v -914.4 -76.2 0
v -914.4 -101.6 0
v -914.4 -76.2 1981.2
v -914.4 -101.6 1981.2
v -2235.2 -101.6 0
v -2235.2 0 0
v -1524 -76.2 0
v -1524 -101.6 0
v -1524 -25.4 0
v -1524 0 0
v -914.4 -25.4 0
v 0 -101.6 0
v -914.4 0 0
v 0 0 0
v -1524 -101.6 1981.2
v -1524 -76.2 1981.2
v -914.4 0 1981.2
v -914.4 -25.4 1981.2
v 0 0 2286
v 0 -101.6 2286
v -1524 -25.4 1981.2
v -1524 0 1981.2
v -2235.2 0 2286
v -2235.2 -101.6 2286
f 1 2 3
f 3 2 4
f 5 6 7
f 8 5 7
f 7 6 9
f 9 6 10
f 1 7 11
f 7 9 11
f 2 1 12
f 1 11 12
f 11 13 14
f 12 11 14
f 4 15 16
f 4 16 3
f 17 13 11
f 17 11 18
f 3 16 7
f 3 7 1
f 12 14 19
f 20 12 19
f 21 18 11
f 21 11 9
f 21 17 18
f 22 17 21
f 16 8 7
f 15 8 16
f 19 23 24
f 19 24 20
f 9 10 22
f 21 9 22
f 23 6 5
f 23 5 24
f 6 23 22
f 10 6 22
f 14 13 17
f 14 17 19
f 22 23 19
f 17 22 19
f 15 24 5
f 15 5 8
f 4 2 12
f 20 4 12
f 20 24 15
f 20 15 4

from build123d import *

# Parameters (mm, degrees)
F0_W     = 2235.2
F0_H     = 2286
F1_DEPTH = 101.6
F2_W     = 609.6
F2_H     = 1981.2
F3_DEPTH = 25.4
F4_W     = 609.6
F4_H     = 1981.2
F5_DEPTH = 25.4


with BuildPart() as f1:
    # F0 (on Front) → F1 (new body)
    with BuildSketch(Plane.XZ):
        with Locations((-1117.6, 1143)):
            Rectangle(F0_W, F0_H)
    extrude(amount=F1_DEPTH)

    # F2 (on face) → F3 (cut)
    with BuildSketch(Plane.XZ.offset(101.6)):
        with Locations((-1219.2, 990.6)):
            Rectangle(F2_W, F2_H)
    extrude(amount=-F3_DEPTH, mode=Mode.SUBTRACT)

    # F4 (on face) → F5 (cut)
    with BuildSketch(Plane(origin=(0, 0, 0), x_dir=(-1, 0, 0), z_dir=(0, 1, 0))):
        with Locations((1219.2, 990.6)):
            Rectangle(F4_W, F4_H)
    extrude(amount=-F5_DEPTH, mode=Mode.SUBTRACT)


solid = f1.part
